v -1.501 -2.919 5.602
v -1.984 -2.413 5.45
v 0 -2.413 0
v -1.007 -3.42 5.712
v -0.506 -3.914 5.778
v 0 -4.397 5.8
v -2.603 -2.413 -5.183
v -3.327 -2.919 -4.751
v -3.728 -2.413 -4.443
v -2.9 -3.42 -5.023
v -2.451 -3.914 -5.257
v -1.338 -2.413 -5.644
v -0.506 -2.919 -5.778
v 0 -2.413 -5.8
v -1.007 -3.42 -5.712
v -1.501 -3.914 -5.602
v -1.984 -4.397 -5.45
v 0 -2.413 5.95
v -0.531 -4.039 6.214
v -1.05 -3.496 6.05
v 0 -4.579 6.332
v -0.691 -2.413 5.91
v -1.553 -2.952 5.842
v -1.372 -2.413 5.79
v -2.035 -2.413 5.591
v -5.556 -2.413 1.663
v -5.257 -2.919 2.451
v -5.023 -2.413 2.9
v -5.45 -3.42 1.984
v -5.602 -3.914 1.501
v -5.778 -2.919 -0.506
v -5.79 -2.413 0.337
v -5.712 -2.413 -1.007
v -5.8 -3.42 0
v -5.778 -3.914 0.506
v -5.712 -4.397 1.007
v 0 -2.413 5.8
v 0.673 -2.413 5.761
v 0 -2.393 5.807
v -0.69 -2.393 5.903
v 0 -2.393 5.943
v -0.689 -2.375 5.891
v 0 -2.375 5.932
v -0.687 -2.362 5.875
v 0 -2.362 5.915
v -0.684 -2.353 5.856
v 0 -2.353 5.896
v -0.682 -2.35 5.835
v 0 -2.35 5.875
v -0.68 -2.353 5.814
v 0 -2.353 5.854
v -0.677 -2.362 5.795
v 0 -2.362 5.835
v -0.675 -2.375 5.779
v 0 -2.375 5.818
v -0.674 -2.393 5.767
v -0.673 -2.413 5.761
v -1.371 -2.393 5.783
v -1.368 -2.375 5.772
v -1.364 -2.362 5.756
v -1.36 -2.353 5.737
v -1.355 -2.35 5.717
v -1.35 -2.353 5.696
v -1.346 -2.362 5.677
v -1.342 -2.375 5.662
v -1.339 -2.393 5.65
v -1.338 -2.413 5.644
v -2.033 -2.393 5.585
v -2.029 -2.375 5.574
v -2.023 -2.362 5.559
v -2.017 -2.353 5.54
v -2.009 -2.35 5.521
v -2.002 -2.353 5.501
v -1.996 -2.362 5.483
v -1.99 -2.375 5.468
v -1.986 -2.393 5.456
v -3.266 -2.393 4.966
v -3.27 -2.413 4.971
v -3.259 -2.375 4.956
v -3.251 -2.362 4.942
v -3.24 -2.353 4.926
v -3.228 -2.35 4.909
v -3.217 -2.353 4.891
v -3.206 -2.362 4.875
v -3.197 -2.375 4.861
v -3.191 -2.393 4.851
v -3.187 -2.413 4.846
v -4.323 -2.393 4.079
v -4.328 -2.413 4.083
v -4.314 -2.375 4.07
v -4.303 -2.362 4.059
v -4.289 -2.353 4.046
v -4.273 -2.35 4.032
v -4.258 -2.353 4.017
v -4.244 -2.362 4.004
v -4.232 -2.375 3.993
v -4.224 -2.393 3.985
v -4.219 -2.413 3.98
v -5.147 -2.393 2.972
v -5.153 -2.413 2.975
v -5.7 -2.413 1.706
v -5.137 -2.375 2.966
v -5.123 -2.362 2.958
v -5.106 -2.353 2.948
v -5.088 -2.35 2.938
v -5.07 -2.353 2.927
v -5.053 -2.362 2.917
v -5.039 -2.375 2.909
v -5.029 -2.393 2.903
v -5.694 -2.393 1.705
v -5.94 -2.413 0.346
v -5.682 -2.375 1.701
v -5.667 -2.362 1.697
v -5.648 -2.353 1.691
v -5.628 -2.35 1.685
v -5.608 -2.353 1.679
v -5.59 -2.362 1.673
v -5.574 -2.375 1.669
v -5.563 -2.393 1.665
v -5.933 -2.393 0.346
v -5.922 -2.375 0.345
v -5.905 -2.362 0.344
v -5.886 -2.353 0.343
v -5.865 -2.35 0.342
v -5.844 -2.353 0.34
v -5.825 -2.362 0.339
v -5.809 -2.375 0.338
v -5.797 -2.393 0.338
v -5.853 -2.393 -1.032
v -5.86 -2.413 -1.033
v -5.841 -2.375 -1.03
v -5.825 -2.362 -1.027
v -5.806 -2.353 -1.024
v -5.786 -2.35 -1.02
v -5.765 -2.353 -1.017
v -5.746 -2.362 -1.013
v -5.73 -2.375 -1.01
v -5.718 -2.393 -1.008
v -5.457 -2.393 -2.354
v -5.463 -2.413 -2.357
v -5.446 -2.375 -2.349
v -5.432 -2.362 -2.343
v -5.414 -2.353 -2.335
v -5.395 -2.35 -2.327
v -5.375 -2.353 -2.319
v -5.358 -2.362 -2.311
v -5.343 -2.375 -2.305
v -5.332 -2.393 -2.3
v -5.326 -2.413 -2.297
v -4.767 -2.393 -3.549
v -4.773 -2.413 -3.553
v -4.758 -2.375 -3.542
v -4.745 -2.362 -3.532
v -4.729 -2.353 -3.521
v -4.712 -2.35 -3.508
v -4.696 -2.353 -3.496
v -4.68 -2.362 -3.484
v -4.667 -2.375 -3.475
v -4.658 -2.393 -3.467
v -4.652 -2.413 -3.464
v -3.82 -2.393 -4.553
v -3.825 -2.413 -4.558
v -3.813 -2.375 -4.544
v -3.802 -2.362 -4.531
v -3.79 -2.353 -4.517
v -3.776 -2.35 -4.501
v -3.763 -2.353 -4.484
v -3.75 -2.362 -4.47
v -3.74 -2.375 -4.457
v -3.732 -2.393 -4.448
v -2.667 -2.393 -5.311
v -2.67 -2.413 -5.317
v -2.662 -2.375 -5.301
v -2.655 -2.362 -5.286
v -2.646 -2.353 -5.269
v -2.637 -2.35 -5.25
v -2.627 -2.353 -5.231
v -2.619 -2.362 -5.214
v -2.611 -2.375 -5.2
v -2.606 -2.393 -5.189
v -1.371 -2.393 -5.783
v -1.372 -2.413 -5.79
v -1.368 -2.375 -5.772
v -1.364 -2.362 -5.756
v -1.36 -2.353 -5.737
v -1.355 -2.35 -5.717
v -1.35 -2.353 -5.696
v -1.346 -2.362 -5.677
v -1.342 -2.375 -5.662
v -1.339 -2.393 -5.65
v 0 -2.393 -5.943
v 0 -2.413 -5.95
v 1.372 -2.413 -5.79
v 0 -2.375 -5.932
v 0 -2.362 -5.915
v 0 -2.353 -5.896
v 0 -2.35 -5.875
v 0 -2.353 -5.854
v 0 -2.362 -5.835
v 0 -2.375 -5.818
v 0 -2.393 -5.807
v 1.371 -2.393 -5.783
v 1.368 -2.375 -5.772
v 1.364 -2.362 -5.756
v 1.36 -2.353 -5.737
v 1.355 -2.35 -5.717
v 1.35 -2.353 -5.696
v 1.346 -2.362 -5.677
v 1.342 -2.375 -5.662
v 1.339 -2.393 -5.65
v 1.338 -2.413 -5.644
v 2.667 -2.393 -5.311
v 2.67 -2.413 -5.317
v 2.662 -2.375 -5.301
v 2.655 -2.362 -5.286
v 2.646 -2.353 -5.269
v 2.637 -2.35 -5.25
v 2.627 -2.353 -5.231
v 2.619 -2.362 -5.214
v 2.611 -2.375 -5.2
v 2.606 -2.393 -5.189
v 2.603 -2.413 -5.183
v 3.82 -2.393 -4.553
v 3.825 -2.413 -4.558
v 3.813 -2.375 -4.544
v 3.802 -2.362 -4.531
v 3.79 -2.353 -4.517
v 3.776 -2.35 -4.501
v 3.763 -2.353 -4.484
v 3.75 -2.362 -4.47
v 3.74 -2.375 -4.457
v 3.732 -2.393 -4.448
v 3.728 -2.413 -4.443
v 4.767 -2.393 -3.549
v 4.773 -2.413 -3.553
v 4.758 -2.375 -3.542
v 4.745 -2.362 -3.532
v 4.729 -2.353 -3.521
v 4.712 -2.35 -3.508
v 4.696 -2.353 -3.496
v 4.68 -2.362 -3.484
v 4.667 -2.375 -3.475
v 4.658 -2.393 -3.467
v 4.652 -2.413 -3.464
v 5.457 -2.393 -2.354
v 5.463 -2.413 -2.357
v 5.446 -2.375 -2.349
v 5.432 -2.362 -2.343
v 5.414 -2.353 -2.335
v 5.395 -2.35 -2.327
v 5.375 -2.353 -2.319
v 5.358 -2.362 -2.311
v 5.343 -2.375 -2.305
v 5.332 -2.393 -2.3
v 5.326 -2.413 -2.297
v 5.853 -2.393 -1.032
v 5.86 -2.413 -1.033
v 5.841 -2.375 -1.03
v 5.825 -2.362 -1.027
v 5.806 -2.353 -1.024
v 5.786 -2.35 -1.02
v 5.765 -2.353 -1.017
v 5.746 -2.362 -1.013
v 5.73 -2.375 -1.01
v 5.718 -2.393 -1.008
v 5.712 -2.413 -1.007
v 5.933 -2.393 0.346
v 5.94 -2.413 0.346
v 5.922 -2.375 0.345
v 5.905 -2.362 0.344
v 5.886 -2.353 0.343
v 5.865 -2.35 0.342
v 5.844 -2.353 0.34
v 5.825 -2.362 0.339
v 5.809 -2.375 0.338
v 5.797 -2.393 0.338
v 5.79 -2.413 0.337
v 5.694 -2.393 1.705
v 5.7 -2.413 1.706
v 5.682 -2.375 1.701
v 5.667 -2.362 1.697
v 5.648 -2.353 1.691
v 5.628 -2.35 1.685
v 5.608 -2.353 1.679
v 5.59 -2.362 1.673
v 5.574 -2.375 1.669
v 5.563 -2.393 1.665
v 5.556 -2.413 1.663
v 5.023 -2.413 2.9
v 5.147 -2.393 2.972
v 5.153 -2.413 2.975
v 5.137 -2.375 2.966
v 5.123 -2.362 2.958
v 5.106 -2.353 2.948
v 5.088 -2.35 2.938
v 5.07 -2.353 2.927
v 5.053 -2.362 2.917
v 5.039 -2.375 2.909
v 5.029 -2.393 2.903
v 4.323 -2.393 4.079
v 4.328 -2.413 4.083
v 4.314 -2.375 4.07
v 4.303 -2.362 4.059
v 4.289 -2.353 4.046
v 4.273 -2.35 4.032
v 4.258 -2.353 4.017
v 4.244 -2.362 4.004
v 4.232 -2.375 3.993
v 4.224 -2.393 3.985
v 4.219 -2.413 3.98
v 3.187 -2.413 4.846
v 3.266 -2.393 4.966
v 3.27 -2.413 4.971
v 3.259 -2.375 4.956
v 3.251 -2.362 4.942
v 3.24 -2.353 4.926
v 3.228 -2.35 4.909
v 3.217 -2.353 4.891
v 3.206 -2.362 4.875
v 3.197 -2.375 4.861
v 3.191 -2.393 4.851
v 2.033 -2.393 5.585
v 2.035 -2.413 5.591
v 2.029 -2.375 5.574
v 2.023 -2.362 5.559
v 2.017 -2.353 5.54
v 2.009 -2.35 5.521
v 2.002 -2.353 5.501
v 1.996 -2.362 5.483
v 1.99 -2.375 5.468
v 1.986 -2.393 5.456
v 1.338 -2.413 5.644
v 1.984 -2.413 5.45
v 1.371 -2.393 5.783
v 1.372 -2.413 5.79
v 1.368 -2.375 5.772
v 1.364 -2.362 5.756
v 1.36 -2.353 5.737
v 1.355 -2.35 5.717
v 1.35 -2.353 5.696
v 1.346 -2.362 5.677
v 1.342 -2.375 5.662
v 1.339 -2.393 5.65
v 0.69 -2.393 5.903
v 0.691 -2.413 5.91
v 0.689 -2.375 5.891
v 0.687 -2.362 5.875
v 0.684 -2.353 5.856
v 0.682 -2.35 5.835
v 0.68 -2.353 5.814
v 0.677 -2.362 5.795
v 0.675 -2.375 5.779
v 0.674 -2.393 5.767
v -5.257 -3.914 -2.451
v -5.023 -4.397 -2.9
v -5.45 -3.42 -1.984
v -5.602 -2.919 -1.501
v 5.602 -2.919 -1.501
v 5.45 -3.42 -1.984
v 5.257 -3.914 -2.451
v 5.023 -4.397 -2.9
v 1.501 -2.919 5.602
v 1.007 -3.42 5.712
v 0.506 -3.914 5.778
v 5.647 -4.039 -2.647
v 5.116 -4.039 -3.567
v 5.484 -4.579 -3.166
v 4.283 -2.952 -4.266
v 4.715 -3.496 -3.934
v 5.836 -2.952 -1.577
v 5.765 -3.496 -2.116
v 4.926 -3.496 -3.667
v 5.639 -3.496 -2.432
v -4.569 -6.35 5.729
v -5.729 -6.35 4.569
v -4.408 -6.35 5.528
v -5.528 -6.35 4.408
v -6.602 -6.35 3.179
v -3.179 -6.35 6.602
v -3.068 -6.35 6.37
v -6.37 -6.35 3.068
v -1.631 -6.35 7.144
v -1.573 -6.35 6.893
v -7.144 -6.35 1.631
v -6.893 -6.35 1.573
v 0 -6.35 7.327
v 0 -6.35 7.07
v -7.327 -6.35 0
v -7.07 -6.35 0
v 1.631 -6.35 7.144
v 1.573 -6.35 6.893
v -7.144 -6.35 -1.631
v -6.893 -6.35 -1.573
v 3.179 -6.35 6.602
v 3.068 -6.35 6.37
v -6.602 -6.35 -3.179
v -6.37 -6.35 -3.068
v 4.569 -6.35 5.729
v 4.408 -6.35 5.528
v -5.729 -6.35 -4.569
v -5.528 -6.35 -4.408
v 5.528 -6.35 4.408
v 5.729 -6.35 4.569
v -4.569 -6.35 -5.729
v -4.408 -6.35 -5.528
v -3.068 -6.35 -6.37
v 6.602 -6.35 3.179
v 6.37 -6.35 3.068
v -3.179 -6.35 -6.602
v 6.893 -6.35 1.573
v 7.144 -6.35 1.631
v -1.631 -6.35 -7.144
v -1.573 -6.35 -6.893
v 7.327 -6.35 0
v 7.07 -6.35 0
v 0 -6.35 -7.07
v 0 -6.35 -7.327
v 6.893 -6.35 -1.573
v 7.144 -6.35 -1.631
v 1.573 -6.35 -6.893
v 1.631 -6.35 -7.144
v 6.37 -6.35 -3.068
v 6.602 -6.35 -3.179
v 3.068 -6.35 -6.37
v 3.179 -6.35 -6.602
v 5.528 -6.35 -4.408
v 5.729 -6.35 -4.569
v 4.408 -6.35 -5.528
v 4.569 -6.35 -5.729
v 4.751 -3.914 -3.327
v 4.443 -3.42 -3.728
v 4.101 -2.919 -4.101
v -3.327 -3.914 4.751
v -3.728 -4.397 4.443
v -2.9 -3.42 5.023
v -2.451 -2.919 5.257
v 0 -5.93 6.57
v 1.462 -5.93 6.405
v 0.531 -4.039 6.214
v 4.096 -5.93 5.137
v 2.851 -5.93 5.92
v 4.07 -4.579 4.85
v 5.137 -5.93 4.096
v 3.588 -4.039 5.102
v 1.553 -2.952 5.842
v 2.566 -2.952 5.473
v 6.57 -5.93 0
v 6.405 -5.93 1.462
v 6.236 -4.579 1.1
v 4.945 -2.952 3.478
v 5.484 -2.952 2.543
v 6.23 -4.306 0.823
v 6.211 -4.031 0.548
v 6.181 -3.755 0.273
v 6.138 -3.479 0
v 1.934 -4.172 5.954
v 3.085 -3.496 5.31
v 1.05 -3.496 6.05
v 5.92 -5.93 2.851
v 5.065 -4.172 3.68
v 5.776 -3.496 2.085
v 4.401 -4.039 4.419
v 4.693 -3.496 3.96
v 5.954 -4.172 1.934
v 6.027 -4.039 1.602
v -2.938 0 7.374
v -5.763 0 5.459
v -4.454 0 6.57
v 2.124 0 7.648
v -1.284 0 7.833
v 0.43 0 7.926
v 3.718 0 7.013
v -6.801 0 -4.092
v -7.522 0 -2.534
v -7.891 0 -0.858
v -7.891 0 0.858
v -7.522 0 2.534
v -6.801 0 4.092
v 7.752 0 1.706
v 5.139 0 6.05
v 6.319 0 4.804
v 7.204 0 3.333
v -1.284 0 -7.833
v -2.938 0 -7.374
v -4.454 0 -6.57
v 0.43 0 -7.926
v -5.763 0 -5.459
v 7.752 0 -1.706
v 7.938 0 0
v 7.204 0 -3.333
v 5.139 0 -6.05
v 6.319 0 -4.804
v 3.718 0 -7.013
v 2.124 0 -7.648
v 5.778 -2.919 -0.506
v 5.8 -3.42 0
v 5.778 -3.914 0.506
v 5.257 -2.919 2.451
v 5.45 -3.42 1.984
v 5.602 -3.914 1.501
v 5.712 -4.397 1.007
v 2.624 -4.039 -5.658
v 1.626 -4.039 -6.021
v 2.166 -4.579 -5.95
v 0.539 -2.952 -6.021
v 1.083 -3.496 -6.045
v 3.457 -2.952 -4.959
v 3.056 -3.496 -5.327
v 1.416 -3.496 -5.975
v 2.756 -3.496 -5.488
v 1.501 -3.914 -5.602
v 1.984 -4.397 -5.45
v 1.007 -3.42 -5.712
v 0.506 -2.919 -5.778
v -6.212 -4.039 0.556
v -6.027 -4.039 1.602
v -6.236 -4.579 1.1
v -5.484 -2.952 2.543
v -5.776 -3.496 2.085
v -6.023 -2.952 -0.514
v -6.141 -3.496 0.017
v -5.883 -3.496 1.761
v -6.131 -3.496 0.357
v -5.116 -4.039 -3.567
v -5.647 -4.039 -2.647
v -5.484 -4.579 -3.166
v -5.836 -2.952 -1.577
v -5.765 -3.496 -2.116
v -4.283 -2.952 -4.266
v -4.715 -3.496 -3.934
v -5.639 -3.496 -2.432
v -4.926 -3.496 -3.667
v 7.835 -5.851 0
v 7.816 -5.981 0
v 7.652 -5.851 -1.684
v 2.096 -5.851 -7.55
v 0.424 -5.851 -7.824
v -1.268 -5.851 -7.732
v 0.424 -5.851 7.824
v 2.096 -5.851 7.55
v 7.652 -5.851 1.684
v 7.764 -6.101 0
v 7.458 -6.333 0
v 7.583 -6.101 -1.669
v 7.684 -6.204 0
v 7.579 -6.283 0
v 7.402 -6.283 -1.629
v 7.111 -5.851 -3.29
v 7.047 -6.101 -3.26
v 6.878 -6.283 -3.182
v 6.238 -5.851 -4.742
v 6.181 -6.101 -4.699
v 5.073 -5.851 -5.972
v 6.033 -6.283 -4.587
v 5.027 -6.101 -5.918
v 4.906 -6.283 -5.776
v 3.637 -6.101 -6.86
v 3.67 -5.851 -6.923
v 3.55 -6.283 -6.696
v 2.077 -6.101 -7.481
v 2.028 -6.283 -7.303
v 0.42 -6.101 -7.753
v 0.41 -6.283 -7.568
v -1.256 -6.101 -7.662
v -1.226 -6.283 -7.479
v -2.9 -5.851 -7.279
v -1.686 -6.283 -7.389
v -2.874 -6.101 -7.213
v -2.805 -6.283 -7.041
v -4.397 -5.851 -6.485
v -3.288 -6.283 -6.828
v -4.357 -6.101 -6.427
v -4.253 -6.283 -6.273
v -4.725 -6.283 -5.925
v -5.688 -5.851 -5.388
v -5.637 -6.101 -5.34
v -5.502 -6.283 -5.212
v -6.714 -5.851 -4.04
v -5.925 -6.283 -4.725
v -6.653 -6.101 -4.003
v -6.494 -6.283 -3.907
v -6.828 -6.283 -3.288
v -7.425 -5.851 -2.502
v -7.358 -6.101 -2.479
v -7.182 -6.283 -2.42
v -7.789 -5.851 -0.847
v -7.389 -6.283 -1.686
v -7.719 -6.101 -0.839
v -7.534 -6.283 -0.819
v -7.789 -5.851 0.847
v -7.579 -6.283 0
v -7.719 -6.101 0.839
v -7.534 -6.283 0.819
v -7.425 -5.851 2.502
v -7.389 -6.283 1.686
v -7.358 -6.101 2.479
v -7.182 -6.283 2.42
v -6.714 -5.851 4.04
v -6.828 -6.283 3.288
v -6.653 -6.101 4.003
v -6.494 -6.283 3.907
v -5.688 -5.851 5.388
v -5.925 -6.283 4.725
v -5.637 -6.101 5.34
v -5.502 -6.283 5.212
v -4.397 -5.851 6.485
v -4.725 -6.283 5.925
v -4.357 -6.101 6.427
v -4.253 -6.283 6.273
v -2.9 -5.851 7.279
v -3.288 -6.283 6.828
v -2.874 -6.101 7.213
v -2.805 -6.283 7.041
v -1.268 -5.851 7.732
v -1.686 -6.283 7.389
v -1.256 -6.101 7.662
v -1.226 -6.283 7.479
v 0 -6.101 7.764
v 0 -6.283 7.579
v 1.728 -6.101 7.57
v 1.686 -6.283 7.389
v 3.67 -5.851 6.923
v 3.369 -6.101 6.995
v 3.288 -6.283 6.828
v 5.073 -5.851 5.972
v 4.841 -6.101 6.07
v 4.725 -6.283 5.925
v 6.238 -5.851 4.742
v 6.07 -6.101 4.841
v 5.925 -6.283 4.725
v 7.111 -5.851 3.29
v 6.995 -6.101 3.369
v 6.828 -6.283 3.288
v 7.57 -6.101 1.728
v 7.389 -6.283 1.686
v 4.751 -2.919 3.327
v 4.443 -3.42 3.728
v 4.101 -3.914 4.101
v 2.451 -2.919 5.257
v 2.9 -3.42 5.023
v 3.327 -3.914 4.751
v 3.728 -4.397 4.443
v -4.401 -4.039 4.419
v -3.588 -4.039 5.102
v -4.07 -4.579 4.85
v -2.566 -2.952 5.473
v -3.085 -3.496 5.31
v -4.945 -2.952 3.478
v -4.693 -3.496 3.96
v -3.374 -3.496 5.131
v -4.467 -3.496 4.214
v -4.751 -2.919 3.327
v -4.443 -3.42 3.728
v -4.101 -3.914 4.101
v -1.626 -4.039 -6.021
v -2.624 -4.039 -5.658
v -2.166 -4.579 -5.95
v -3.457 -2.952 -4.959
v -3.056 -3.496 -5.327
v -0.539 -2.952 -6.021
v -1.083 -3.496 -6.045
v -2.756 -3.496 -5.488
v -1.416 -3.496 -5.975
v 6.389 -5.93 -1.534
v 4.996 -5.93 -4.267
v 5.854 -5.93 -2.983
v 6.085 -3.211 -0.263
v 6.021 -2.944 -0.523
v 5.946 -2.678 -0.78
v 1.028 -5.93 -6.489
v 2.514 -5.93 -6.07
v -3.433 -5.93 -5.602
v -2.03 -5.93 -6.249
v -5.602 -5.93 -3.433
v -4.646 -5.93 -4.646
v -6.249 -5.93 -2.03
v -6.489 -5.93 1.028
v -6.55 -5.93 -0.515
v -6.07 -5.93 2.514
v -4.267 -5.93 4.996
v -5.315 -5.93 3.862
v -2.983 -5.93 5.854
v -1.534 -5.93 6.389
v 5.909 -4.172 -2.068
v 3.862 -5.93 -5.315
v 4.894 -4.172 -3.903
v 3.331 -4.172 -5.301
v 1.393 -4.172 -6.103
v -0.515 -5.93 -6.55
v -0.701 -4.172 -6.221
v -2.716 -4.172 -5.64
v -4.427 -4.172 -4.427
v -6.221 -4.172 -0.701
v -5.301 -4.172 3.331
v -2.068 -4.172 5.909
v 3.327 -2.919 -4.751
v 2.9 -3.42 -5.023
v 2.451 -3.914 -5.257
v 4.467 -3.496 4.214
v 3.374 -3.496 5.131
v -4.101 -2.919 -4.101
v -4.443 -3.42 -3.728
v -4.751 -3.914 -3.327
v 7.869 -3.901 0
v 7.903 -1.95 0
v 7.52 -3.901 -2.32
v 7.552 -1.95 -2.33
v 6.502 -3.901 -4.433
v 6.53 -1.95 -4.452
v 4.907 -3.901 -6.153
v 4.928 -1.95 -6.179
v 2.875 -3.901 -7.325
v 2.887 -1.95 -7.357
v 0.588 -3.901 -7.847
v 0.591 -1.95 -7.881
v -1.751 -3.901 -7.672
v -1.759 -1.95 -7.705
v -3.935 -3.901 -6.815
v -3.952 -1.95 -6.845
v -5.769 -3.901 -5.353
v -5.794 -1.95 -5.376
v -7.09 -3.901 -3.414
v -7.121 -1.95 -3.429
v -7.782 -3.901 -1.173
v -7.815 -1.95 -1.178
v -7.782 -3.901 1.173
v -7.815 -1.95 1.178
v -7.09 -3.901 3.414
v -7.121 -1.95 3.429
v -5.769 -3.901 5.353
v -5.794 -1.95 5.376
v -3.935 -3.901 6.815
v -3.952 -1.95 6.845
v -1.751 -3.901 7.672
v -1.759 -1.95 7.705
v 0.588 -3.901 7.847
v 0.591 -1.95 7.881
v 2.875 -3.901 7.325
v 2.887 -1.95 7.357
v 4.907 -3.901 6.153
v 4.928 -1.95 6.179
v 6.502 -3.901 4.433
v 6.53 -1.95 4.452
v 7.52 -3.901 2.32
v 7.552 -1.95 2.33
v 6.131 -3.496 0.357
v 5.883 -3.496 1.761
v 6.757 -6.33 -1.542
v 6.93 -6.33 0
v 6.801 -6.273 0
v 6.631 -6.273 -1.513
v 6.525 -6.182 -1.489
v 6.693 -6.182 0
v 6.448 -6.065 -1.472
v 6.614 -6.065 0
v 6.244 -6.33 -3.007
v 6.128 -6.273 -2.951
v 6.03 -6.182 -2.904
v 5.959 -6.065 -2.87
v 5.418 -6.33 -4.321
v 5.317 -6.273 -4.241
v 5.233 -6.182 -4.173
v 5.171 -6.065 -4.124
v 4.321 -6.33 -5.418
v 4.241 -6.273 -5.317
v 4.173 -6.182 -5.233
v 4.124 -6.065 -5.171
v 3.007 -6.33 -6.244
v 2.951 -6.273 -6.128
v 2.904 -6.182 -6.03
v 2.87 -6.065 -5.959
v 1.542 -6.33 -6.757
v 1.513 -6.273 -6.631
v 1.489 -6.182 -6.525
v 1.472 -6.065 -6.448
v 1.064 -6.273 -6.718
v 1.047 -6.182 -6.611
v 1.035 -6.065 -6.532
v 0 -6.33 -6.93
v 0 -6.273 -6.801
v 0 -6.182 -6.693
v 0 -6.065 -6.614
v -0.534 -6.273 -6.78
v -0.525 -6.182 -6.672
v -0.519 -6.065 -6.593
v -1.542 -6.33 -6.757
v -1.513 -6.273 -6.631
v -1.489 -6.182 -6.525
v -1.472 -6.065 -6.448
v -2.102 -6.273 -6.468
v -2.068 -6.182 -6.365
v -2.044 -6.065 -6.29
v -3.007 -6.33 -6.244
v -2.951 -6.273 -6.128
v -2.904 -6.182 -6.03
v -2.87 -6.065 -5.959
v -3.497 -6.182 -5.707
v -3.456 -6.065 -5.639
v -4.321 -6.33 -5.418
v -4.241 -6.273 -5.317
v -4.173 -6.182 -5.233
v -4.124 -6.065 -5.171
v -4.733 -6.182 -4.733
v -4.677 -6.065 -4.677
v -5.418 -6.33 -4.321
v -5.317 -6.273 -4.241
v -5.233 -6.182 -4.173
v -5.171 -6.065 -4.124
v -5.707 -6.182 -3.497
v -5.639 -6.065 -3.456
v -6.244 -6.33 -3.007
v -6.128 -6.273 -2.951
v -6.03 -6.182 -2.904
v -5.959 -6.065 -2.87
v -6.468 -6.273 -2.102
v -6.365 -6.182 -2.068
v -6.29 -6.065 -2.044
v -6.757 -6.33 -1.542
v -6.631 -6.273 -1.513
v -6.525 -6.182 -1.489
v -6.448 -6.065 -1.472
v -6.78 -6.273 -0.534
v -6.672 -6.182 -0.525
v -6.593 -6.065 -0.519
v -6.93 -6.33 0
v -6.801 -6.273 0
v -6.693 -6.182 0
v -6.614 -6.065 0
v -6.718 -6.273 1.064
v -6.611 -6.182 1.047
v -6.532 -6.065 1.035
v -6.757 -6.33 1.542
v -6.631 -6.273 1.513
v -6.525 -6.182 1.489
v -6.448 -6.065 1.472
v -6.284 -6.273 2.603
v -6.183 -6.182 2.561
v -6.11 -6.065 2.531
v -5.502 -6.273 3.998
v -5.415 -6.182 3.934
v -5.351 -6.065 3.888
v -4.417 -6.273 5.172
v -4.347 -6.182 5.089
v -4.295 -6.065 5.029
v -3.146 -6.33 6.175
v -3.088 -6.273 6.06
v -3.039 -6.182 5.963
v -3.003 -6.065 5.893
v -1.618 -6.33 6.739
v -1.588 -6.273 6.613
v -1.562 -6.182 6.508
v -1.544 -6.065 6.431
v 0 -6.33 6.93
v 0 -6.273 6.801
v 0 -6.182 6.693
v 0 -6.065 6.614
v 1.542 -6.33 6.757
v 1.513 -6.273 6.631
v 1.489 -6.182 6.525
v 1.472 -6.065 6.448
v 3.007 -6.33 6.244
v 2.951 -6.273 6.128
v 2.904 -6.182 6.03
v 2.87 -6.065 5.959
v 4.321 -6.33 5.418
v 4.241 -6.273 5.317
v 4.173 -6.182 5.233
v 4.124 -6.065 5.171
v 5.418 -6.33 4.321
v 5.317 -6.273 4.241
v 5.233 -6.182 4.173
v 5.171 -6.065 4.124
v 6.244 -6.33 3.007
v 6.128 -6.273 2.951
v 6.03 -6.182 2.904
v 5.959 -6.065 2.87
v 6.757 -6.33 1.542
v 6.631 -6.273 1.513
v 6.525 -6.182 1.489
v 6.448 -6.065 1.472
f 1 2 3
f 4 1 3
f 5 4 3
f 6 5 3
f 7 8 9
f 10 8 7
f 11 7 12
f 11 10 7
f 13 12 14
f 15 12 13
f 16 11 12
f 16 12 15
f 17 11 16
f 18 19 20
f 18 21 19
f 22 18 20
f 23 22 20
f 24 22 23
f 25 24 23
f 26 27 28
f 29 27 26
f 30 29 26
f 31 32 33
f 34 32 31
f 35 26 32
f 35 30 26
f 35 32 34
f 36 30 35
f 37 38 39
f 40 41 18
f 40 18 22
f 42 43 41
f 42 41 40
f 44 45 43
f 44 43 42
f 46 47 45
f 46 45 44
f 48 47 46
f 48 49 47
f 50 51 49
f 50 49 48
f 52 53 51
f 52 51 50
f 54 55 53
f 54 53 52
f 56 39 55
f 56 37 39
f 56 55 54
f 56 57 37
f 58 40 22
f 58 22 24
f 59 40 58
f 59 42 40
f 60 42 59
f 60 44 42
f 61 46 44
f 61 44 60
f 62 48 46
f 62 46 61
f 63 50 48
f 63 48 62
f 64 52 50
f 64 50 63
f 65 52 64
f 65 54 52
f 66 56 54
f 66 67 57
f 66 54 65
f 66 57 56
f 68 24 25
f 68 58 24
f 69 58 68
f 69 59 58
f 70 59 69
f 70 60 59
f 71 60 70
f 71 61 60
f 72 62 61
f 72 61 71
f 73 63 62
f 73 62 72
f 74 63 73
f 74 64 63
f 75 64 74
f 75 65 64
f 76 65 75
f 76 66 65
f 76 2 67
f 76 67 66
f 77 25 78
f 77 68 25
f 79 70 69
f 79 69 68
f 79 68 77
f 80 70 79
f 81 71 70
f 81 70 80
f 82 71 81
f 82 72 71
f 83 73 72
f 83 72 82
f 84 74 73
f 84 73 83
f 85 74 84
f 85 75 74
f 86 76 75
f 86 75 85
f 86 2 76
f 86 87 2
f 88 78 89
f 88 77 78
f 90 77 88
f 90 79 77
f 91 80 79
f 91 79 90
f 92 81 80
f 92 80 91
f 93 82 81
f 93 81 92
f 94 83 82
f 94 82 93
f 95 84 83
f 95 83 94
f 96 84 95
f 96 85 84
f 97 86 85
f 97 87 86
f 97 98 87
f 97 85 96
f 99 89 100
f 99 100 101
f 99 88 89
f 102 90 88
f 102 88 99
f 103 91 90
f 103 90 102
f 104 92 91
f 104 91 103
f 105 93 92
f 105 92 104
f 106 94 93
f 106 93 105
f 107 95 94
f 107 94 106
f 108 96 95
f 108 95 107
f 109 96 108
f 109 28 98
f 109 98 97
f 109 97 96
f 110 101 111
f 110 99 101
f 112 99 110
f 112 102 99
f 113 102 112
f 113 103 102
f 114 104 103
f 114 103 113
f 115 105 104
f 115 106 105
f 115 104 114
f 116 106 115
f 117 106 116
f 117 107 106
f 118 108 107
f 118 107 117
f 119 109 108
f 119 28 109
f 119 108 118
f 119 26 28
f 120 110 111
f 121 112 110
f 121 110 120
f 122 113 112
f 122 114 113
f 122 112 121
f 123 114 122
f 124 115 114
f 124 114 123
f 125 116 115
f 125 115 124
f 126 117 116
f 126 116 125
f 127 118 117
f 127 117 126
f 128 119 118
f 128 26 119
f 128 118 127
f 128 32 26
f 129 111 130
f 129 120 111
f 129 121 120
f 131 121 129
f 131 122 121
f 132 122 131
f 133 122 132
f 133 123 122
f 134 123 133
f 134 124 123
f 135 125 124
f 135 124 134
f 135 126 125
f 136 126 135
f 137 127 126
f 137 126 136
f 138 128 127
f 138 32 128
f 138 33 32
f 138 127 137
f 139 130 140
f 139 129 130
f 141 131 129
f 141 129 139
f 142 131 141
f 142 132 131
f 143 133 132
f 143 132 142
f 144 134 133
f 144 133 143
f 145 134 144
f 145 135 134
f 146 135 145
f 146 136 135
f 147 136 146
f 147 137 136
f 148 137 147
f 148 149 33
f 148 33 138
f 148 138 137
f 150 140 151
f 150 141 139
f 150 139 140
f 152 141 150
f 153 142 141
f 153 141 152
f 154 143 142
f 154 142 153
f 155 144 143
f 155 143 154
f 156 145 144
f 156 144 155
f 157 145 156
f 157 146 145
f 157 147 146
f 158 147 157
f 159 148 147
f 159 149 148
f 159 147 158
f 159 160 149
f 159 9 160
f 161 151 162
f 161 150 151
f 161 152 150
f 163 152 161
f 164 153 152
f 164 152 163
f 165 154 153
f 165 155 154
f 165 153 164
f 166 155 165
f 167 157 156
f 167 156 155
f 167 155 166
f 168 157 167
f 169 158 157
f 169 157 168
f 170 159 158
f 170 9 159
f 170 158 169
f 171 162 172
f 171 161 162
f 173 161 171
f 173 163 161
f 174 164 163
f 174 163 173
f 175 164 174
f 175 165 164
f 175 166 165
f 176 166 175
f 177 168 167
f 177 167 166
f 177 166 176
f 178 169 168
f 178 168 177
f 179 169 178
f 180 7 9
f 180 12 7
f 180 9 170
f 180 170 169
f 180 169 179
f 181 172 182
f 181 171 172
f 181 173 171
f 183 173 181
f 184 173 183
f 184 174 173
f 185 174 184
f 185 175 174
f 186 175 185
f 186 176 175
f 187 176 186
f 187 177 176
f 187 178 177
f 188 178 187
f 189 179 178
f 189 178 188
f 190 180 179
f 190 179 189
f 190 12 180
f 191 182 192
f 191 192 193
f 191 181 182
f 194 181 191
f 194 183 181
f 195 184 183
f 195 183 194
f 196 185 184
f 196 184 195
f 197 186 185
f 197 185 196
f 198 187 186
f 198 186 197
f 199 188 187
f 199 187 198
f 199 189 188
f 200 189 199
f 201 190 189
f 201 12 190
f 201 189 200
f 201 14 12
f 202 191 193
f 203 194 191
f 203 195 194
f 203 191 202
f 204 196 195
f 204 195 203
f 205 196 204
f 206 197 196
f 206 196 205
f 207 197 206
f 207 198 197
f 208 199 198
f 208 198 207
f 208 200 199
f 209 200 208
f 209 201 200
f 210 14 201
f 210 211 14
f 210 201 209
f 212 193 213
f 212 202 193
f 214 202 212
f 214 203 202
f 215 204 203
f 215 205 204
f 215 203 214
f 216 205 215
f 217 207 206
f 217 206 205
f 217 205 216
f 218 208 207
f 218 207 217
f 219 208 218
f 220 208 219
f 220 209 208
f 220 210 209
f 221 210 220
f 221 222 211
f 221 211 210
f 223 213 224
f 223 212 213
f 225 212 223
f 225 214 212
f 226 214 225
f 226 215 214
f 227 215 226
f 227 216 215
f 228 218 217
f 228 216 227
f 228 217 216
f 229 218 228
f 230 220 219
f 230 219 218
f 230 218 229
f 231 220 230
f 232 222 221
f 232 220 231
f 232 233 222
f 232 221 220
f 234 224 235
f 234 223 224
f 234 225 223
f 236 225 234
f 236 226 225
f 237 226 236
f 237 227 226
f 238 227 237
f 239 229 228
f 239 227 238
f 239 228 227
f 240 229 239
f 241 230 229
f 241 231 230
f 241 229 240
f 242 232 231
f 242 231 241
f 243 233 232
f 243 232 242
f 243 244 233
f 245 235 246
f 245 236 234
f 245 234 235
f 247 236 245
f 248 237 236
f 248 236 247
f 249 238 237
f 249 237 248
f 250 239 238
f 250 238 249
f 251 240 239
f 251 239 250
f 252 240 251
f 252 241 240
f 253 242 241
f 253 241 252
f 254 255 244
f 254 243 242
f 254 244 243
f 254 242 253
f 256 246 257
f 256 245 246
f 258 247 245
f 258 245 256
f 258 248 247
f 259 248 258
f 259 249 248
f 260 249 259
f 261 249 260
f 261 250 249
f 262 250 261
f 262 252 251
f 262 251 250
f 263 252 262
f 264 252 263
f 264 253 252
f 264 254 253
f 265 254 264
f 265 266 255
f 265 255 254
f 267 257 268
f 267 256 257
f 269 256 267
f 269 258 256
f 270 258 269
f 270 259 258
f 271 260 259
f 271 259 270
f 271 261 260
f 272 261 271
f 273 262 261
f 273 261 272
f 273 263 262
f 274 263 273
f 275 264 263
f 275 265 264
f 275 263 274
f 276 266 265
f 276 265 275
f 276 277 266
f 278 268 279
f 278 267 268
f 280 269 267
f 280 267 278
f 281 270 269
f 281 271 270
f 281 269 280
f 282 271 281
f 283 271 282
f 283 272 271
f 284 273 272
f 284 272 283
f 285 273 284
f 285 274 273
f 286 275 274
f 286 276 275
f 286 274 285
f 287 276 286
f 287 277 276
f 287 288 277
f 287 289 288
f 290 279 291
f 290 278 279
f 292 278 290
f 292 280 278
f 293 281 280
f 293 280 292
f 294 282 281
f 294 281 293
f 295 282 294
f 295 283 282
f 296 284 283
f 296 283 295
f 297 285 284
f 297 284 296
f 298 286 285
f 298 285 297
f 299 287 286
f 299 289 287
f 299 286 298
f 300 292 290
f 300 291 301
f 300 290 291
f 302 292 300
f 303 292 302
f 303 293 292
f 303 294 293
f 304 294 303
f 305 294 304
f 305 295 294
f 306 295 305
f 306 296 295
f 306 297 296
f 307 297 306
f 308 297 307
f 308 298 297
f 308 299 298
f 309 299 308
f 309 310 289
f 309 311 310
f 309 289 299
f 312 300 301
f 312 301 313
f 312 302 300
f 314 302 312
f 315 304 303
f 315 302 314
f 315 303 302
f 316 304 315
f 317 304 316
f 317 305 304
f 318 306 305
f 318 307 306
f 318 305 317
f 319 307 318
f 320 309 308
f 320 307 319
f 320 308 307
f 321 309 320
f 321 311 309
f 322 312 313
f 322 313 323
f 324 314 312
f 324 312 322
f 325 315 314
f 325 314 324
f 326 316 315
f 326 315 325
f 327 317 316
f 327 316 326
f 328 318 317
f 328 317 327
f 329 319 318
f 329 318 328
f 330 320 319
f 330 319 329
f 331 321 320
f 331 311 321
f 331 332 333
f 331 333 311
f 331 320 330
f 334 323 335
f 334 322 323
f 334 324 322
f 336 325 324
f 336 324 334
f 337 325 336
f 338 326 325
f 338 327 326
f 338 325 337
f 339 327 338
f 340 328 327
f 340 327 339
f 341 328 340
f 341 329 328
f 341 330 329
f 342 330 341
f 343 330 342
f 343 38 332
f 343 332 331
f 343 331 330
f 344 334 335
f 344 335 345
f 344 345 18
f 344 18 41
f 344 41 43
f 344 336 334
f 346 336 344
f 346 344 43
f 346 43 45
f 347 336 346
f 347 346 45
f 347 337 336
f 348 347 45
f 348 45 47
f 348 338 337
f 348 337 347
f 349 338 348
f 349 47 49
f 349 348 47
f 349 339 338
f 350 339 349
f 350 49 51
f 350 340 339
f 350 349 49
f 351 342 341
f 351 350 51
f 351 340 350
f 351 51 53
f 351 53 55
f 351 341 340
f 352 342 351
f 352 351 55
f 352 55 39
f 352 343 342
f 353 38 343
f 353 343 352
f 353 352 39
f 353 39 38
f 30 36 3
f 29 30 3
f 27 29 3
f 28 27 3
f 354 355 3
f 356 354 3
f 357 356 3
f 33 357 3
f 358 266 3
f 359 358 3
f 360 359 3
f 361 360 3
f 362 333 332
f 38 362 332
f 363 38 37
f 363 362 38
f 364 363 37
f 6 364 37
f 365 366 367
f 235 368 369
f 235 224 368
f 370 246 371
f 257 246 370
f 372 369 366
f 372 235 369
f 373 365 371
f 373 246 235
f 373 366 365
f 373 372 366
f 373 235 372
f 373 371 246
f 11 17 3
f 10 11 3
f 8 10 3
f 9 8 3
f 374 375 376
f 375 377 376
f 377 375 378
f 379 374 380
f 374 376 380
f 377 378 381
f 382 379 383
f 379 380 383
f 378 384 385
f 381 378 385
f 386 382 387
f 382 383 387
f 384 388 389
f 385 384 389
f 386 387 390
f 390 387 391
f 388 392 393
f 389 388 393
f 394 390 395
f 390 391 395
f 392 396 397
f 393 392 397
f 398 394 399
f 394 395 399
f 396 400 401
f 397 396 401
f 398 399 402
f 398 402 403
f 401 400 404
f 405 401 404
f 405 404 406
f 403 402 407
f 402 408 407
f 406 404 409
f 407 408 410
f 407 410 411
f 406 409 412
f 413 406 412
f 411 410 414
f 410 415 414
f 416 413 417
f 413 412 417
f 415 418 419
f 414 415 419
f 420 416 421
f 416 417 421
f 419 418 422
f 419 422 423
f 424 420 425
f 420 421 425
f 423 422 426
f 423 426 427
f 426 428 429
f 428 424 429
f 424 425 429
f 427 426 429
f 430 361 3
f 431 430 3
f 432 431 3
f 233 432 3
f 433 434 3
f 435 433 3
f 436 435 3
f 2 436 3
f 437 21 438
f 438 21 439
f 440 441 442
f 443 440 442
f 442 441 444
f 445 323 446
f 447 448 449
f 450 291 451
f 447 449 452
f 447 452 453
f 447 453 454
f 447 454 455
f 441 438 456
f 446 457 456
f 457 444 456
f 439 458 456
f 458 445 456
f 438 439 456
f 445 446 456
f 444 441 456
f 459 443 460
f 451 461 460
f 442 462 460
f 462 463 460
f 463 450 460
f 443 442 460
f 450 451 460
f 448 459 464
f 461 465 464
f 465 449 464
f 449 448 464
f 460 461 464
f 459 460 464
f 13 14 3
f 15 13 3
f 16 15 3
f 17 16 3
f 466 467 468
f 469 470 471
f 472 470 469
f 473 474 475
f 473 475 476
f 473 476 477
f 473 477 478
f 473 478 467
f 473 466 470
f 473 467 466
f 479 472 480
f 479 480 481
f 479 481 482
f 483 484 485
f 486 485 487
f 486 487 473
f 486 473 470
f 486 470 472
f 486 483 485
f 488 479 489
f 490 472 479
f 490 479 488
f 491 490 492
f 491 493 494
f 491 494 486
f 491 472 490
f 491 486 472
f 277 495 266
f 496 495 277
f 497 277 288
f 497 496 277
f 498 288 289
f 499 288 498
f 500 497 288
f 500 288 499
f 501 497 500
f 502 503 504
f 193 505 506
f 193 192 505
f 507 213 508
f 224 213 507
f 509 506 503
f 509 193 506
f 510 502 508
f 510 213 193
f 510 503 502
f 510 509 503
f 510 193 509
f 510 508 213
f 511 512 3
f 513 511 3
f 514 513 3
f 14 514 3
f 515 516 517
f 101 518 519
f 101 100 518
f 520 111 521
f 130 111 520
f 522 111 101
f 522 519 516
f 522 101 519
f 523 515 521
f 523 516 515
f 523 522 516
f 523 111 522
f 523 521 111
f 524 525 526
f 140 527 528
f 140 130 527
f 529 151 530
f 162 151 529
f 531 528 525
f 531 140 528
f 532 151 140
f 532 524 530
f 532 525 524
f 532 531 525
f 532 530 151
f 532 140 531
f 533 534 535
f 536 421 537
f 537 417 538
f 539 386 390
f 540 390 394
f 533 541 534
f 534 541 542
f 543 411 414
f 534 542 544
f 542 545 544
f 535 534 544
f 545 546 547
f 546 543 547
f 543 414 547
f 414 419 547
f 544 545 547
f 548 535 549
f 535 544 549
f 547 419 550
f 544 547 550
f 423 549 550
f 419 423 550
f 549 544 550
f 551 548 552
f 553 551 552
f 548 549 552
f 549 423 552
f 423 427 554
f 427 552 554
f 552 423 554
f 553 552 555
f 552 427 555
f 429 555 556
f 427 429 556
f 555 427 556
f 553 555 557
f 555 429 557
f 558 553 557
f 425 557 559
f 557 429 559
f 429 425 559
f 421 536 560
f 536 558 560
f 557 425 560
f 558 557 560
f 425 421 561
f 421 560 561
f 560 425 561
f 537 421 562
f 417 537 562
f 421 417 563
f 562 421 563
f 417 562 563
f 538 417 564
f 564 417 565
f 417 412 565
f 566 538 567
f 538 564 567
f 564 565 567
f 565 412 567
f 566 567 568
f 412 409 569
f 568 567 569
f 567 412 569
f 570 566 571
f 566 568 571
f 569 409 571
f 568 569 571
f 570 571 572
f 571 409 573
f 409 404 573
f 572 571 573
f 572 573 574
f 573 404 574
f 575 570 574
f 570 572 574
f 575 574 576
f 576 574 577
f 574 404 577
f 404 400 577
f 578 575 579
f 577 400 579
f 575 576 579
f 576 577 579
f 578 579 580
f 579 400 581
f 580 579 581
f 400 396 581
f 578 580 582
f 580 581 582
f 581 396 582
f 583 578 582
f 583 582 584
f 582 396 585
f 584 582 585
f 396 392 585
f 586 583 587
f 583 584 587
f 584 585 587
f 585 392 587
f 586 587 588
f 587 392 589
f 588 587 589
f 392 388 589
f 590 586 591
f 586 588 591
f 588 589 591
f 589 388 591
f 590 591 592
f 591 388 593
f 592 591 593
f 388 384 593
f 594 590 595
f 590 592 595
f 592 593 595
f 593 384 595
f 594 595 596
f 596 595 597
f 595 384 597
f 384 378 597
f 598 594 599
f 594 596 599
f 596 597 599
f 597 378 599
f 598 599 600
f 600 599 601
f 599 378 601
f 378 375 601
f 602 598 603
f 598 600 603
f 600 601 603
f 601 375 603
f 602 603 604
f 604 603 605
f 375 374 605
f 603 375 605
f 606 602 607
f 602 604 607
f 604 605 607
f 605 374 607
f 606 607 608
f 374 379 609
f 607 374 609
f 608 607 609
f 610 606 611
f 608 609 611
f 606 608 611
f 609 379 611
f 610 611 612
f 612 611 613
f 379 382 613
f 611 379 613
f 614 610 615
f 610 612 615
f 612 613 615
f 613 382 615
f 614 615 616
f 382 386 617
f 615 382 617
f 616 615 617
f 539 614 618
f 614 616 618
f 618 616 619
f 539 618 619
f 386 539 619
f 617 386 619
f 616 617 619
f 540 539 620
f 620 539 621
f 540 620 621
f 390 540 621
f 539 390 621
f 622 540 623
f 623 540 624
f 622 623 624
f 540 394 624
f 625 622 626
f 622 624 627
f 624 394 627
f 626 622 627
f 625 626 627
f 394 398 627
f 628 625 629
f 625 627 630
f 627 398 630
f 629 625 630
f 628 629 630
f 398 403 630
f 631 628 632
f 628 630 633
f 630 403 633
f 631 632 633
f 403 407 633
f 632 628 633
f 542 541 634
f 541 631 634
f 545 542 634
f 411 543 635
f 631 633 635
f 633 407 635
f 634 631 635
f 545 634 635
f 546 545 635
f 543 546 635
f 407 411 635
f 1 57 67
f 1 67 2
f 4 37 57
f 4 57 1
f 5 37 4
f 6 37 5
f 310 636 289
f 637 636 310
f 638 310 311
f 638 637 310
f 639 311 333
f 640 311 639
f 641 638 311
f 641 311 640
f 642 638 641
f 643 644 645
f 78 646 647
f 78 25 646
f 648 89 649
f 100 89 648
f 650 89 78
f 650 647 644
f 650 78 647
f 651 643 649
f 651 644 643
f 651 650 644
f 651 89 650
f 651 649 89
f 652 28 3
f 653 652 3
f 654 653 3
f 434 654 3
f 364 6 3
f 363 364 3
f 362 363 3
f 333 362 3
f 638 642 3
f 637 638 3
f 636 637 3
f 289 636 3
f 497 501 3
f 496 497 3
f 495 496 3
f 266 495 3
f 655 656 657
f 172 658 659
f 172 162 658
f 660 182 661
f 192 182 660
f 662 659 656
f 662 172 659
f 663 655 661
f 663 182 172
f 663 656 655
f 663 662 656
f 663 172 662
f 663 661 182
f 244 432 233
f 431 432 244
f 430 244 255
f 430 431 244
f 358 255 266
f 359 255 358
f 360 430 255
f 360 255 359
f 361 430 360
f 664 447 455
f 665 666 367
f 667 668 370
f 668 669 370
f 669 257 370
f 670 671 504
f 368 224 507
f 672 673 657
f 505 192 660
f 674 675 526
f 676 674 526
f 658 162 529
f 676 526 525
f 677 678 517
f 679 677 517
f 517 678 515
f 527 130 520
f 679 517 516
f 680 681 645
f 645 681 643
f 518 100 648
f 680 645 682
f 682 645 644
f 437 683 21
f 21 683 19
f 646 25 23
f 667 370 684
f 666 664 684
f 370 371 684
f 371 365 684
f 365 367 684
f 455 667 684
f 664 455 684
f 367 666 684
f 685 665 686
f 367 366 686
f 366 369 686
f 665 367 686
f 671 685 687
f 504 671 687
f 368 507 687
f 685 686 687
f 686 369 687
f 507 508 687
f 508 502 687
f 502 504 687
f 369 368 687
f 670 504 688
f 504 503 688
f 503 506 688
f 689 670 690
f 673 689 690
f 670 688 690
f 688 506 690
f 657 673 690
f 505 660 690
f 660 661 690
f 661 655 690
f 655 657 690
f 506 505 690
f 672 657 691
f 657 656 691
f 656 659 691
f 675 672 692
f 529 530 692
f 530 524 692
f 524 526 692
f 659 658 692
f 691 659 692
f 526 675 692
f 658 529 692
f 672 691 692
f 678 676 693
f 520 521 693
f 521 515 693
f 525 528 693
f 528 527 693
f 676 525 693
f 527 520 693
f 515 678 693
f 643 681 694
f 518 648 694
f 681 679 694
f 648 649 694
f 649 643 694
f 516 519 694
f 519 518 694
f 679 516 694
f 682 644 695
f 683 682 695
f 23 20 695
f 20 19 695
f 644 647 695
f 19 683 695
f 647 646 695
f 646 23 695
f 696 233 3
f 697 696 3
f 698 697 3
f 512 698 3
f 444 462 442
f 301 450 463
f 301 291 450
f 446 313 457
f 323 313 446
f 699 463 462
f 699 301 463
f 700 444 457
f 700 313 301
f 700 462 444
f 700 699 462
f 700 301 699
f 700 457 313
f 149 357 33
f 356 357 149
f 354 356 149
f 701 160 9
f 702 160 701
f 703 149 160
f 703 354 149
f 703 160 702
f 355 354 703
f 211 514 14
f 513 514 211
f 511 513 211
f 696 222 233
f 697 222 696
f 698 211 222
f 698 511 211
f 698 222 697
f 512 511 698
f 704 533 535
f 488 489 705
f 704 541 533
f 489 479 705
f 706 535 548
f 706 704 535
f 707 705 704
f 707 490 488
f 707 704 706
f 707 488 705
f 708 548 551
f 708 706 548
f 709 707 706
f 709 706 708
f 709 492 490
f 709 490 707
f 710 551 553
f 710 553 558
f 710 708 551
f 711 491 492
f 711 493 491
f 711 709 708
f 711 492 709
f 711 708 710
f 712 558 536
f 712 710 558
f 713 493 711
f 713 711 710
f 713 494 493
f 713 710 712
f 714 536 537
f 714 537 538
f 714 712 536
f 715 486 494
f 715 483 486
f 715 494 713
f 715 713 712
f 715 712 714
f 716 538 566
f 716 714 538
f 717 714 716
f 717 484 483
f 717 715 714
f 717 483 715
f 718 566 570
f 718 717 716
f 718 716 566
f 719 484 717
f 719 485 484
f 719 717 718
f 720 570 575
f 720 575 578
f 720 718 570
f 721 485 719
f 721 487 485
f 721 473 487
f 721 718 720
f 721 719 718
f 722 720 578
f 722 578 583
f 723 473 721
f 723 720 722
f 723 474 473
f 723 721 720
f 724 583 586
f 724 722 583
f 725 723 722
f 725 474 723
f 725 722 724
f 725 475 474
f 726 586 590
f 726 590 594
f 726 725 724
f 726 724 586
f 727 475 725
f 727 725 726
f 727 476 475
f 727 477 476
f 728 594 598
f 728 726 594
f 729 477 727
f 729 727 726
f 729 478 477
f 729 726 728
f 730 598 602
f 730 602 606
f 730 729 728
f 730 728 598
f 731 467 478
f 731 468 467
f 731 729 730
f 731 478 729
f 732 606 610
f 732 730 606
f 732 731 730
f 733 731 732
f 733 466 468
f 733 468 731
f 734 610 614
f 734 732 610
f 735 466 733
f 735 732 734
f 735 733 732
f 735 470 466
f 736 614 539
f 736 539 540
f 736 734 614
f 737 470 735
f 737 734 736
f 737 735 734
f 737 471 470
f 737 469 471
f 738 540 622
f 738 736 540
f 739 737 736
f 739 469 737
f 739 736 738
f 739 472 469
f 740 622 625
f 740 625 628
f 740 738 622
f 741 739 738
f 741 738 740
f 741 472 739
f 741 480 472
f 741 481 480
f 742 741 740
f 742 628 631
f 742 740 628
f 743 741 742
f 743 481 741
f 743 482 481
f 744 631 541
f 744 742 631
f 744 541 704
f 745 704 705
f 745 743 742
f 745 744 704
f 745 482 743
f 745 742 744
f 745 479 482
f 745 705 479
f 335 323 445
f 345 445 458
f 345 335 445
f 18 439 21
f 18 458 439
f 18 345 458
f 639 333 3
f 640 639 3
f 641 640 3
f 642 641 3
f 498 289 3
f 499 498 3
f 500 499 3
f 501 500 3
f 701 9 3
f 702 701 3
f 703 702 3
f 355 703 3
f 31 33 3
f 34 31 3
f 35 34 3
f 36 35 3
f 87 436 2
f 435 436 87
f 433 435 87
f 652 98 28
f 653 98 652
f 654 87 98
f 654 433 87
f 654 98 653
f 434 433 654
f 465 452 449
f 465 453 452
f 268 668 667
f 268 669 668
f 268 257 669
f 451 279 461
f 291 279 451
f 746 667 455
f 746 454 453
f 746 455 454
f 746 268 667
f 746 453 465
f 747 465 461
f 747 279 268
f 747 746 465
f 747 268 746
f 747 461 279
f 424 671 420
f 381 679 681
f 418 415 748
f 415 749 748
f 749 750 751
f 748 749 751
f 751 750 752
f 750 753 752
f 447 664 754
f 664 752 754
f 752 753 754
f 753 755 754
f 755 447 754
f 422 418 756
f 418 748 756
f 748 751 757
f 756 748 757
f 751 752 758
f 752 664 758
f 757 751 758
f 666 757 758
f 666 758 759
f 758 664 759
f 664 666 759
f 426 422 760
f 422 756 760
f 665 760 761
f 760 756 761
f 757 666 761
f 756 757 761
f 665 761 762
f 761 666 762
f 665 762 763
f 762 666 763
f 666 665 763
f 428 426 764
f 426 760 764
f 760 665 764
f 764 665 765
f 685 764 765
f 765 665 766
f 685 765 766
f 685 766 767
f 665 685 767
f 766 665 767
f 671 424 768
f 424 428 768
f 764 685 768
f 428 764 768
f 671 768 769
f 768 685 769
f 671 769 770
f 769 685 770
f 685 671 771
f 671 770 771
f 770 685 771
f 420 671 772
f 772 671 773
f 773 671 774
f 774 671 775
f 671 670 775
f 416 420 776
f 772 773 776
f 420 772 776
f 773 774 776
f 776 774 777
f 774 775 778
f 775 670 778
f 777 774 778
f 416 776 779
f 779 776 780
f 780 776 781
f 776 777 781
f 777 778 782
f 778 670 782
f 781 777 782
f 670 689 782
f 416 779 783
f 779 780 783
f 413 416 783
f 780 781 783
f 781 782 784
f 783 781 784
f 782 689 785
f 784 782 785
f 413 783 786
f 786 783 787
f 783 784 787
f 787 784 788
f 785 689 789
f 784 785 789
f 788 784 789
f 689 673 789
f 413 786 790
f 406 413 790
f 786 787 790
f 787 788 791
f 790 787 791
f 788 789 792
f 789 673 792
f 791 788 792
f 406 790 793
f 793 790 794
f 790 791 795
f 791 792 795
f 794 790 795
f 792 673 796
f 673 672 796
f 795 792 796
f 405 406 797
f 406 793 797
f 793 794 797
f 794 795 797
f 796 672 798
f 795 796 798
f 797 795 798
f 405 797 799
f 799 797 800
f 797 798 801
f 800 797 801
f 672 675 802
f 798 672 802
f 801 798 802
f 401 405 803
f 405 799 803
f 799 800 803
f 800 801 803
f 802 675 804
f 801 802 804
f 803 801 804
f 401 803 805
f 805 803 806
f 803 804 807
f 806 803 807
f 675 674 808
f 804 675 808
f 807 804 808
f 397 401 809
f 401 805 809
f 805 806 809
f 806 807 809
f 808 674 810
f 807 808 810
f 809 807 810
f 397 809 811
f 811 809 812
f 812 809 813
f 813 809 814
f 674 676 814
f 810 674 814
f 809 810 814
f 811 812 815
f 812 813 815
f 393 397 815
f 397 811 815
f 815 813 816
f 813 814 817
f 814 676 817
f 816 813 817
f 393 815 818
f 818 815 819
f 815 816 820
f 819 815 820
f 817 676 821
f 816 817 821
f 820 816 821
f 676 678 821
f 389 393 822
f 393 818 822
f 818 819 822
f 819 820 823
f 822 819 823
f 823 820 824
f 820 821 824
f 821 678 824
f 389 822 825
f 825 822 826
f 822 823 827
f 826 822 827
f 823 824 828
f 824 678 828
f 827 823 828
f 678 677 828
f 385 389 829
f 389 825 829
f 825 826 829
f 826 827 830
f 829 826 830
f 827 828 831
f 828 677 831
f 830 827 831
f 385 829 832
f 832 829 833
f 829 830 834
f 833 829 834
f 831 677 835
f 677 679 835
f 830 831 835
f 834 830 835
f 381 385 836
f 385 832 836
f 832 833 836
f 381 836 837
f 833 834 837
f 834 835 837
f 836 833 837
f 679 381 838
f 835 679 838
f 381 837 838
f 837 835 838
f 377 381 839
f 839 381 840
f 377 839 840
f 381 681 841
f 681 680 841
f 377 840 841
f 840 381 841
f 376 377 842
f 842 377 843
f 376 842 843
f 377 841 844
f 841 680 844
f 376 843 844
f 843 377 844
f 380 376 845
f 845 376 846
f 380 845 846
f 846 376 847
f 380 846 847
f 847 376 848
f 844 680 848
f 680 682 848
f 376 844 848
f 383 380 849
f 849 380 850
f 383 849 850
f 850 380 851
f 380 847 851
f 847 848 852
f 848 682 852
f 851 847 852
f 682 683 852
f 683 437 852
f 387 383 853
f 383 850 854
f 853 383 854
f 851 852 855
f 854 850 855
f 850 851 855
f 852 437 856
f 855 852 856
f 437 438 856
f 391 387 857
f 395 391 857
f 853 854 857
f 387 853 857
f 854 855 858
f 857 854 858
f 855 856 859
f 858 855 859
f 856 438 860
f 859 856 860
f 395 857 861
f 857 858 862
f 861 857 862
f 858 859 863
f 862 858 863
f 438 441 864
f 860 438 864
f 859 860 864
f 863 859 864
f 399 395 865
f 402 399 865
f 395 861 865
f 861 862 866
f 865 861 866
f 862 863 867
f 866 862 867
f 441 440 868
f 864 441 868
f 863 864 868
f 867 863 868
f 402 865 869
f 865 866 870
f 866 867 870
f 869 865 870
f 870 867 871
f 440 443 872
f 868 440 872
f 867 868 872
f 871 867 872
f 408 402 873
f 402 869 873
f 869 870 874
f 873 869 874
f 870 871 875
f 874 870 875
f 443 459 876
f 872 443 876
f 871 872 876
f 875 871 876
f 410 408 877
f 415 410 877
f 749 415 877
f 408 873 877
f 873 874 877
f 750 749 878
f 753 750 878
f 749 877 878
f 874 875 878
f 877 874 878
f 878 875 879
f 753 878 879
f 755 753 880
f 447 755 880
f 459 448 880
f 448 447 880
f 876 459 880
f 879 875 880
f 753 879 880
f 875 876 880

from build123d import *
from build123d.topology import SkipClean

# Parameters (mm, degrees)
SKETCH1_R           = 7.9375
BOSS_EXTRUDE1_DEPTH = 6.35
BOSS_EXTRUDE1_DRAFT = -1
CUT_EXTRUDE3_DEPTH  = 8.9375
CIRPATTERN3_COUNT   = 9
SKETCH7_R           = 7.9375
SKETCH7_R_2         = 5.5245
BOSS_EXTRUDE3_DEPTH = 6.35
BOSS_EXTRUDE3_DRAFT = -1
DRAFT1_ANGLE        = -10
FILLET2_R           = 0.508


with BuildPart() as part:
    # Sketch1 → Boss-Extrude1 (with draft: the straight prism first)
    with BuildSketch(Plane(origin=(0, 0, 0), x_dir=(1, 0, 0), z_dir=(0, 1, 0))):
        Circle(SKETCH1_R)
    extrude(amount=-BOSS_EXTRUDE1_DEPTH)
    # Boss-Extrude1: the draft: its side faces are tilted about the plane it starts from
    boss_extrude1_sides = [part.faces().sort_by_distance(p)[0] for p in [
        (-7.9375, -3.175, 0),
    ]]
    draft(boss_extrude1_sides, Plane(origin=(0, 0, 0), x_dir=(1, 0, 0), z_dir=(0, 1, 0)), BOSS_EXTRUDE1_DRAFT)

    # Sketch6 → Cut-Extrude3 (cut, through all)
    with BuildSketch(Plane.XY):
        Polygon((0, -2.413), (-7.112, -9.525), (7.112, -9.525), align=None)
    cut_extrude3 = extrude(amount=-CUT_EXTRUDE3_DEPTH, mode=Mode.SUBTRACT)

    # CirPattern3: Cut-Extrude3 ×9 about axis
    cirpattern3_axis = Axis((0, 0, 0), (0, 1, 0))
    for i in range(1, CIRPATTERN3_COUNT):
        add(cut_extrude3.rotate(cirpattern3_axis, i * 360 / CIRPATTERN3_COUNT), mode=Mode.SUBTRACT)


with BuildPart() as boss_extrude3_tool:
    # Sketch7 → Boss-Extrude3 (with draft: the straight prism first)
    with BuildSketch(Plane(origin=(0, 0, 0), x_dir=(1, 0, 0), z_dir=(0, 1, 0))):
        Circle(SKETCH7_R)
        Circle(SKETCH7_R_2, mode=Mode.SUBTRACT)
    extrude(amount=-BOSS_EXTRUDE3_DEPTH)
    # Boss-Extrude3: the draft: its side faces are tilted about the plane it starts from
    boss_extrude3_sides = [boss_extrude3_tool.faces().sort_by_distance(p)[0] for p in [
        (-7.9375, -3.175, 0),
        (-5.5245, -3.175, 0),
    ]]
    draft(boss_extrude3_sides, Plane(origin=(0, 0, 0), x_dir=(1, 0, 0), z_dir=(0, 1, 0)), BOSS_EXTRUDE3_DRAFT)


with BuildPart() as part_1:
    add(part.part)

    # Boss-Extrude3: add boss_extrude3_tool
    add(boss_extrude3_tool.part)

    # Draft1
    draft1_faces = [part_1.faces().sort_by_distance(p)[0] for p in [
        (-5.600979367, -4.381499996, 0),
    ]]
    draft(draft1_faces, Plane.ZX, DRAFT1_ANGLE)

    # Fillet2
    fillet2_edges = [part_1.edges().sort_by_distance(p)[0] for p in [
        (-7.826660338, -6.35, 0),
        (-6.644176327, -6.35, 0),
    ]]
    fillet(fillet2_edges, radius=FILLET2_R)

    # Sketch8 → Cut-Revolve1 (revolve, cut)
    with SkipClean():  # keep this step's faces unmerged: merging them makes the solid invalid here
        with BuildSketch(Plane(origin=(0, 0, 0), x_dir=(0, 0, -1), z_dir=(1, 0, 0))):
            with BuildLine():
                Line((-5.800063528, -2.413), (-5.800063528, -6.720189325))
                Line((-5.800063528, -6.720189325), (-6.570156602, -6.720189325))
                Line((-6.570156602, -6.720189325), (-6.570156602, -5.930213274))
                Line((-6.570156602, -5.930213274), (-5.949977004, -2.413))
                ThreePointArc((-5.949977004, -2.413), (-5.875020266, -2.350103828), (-5.800063528, -2.413))
            make_face()
        revolve(axis=Axis((0, 0, 0), (0, -1, 0)), mode=Mode.SUBTRACT)


solid = part_1.part
